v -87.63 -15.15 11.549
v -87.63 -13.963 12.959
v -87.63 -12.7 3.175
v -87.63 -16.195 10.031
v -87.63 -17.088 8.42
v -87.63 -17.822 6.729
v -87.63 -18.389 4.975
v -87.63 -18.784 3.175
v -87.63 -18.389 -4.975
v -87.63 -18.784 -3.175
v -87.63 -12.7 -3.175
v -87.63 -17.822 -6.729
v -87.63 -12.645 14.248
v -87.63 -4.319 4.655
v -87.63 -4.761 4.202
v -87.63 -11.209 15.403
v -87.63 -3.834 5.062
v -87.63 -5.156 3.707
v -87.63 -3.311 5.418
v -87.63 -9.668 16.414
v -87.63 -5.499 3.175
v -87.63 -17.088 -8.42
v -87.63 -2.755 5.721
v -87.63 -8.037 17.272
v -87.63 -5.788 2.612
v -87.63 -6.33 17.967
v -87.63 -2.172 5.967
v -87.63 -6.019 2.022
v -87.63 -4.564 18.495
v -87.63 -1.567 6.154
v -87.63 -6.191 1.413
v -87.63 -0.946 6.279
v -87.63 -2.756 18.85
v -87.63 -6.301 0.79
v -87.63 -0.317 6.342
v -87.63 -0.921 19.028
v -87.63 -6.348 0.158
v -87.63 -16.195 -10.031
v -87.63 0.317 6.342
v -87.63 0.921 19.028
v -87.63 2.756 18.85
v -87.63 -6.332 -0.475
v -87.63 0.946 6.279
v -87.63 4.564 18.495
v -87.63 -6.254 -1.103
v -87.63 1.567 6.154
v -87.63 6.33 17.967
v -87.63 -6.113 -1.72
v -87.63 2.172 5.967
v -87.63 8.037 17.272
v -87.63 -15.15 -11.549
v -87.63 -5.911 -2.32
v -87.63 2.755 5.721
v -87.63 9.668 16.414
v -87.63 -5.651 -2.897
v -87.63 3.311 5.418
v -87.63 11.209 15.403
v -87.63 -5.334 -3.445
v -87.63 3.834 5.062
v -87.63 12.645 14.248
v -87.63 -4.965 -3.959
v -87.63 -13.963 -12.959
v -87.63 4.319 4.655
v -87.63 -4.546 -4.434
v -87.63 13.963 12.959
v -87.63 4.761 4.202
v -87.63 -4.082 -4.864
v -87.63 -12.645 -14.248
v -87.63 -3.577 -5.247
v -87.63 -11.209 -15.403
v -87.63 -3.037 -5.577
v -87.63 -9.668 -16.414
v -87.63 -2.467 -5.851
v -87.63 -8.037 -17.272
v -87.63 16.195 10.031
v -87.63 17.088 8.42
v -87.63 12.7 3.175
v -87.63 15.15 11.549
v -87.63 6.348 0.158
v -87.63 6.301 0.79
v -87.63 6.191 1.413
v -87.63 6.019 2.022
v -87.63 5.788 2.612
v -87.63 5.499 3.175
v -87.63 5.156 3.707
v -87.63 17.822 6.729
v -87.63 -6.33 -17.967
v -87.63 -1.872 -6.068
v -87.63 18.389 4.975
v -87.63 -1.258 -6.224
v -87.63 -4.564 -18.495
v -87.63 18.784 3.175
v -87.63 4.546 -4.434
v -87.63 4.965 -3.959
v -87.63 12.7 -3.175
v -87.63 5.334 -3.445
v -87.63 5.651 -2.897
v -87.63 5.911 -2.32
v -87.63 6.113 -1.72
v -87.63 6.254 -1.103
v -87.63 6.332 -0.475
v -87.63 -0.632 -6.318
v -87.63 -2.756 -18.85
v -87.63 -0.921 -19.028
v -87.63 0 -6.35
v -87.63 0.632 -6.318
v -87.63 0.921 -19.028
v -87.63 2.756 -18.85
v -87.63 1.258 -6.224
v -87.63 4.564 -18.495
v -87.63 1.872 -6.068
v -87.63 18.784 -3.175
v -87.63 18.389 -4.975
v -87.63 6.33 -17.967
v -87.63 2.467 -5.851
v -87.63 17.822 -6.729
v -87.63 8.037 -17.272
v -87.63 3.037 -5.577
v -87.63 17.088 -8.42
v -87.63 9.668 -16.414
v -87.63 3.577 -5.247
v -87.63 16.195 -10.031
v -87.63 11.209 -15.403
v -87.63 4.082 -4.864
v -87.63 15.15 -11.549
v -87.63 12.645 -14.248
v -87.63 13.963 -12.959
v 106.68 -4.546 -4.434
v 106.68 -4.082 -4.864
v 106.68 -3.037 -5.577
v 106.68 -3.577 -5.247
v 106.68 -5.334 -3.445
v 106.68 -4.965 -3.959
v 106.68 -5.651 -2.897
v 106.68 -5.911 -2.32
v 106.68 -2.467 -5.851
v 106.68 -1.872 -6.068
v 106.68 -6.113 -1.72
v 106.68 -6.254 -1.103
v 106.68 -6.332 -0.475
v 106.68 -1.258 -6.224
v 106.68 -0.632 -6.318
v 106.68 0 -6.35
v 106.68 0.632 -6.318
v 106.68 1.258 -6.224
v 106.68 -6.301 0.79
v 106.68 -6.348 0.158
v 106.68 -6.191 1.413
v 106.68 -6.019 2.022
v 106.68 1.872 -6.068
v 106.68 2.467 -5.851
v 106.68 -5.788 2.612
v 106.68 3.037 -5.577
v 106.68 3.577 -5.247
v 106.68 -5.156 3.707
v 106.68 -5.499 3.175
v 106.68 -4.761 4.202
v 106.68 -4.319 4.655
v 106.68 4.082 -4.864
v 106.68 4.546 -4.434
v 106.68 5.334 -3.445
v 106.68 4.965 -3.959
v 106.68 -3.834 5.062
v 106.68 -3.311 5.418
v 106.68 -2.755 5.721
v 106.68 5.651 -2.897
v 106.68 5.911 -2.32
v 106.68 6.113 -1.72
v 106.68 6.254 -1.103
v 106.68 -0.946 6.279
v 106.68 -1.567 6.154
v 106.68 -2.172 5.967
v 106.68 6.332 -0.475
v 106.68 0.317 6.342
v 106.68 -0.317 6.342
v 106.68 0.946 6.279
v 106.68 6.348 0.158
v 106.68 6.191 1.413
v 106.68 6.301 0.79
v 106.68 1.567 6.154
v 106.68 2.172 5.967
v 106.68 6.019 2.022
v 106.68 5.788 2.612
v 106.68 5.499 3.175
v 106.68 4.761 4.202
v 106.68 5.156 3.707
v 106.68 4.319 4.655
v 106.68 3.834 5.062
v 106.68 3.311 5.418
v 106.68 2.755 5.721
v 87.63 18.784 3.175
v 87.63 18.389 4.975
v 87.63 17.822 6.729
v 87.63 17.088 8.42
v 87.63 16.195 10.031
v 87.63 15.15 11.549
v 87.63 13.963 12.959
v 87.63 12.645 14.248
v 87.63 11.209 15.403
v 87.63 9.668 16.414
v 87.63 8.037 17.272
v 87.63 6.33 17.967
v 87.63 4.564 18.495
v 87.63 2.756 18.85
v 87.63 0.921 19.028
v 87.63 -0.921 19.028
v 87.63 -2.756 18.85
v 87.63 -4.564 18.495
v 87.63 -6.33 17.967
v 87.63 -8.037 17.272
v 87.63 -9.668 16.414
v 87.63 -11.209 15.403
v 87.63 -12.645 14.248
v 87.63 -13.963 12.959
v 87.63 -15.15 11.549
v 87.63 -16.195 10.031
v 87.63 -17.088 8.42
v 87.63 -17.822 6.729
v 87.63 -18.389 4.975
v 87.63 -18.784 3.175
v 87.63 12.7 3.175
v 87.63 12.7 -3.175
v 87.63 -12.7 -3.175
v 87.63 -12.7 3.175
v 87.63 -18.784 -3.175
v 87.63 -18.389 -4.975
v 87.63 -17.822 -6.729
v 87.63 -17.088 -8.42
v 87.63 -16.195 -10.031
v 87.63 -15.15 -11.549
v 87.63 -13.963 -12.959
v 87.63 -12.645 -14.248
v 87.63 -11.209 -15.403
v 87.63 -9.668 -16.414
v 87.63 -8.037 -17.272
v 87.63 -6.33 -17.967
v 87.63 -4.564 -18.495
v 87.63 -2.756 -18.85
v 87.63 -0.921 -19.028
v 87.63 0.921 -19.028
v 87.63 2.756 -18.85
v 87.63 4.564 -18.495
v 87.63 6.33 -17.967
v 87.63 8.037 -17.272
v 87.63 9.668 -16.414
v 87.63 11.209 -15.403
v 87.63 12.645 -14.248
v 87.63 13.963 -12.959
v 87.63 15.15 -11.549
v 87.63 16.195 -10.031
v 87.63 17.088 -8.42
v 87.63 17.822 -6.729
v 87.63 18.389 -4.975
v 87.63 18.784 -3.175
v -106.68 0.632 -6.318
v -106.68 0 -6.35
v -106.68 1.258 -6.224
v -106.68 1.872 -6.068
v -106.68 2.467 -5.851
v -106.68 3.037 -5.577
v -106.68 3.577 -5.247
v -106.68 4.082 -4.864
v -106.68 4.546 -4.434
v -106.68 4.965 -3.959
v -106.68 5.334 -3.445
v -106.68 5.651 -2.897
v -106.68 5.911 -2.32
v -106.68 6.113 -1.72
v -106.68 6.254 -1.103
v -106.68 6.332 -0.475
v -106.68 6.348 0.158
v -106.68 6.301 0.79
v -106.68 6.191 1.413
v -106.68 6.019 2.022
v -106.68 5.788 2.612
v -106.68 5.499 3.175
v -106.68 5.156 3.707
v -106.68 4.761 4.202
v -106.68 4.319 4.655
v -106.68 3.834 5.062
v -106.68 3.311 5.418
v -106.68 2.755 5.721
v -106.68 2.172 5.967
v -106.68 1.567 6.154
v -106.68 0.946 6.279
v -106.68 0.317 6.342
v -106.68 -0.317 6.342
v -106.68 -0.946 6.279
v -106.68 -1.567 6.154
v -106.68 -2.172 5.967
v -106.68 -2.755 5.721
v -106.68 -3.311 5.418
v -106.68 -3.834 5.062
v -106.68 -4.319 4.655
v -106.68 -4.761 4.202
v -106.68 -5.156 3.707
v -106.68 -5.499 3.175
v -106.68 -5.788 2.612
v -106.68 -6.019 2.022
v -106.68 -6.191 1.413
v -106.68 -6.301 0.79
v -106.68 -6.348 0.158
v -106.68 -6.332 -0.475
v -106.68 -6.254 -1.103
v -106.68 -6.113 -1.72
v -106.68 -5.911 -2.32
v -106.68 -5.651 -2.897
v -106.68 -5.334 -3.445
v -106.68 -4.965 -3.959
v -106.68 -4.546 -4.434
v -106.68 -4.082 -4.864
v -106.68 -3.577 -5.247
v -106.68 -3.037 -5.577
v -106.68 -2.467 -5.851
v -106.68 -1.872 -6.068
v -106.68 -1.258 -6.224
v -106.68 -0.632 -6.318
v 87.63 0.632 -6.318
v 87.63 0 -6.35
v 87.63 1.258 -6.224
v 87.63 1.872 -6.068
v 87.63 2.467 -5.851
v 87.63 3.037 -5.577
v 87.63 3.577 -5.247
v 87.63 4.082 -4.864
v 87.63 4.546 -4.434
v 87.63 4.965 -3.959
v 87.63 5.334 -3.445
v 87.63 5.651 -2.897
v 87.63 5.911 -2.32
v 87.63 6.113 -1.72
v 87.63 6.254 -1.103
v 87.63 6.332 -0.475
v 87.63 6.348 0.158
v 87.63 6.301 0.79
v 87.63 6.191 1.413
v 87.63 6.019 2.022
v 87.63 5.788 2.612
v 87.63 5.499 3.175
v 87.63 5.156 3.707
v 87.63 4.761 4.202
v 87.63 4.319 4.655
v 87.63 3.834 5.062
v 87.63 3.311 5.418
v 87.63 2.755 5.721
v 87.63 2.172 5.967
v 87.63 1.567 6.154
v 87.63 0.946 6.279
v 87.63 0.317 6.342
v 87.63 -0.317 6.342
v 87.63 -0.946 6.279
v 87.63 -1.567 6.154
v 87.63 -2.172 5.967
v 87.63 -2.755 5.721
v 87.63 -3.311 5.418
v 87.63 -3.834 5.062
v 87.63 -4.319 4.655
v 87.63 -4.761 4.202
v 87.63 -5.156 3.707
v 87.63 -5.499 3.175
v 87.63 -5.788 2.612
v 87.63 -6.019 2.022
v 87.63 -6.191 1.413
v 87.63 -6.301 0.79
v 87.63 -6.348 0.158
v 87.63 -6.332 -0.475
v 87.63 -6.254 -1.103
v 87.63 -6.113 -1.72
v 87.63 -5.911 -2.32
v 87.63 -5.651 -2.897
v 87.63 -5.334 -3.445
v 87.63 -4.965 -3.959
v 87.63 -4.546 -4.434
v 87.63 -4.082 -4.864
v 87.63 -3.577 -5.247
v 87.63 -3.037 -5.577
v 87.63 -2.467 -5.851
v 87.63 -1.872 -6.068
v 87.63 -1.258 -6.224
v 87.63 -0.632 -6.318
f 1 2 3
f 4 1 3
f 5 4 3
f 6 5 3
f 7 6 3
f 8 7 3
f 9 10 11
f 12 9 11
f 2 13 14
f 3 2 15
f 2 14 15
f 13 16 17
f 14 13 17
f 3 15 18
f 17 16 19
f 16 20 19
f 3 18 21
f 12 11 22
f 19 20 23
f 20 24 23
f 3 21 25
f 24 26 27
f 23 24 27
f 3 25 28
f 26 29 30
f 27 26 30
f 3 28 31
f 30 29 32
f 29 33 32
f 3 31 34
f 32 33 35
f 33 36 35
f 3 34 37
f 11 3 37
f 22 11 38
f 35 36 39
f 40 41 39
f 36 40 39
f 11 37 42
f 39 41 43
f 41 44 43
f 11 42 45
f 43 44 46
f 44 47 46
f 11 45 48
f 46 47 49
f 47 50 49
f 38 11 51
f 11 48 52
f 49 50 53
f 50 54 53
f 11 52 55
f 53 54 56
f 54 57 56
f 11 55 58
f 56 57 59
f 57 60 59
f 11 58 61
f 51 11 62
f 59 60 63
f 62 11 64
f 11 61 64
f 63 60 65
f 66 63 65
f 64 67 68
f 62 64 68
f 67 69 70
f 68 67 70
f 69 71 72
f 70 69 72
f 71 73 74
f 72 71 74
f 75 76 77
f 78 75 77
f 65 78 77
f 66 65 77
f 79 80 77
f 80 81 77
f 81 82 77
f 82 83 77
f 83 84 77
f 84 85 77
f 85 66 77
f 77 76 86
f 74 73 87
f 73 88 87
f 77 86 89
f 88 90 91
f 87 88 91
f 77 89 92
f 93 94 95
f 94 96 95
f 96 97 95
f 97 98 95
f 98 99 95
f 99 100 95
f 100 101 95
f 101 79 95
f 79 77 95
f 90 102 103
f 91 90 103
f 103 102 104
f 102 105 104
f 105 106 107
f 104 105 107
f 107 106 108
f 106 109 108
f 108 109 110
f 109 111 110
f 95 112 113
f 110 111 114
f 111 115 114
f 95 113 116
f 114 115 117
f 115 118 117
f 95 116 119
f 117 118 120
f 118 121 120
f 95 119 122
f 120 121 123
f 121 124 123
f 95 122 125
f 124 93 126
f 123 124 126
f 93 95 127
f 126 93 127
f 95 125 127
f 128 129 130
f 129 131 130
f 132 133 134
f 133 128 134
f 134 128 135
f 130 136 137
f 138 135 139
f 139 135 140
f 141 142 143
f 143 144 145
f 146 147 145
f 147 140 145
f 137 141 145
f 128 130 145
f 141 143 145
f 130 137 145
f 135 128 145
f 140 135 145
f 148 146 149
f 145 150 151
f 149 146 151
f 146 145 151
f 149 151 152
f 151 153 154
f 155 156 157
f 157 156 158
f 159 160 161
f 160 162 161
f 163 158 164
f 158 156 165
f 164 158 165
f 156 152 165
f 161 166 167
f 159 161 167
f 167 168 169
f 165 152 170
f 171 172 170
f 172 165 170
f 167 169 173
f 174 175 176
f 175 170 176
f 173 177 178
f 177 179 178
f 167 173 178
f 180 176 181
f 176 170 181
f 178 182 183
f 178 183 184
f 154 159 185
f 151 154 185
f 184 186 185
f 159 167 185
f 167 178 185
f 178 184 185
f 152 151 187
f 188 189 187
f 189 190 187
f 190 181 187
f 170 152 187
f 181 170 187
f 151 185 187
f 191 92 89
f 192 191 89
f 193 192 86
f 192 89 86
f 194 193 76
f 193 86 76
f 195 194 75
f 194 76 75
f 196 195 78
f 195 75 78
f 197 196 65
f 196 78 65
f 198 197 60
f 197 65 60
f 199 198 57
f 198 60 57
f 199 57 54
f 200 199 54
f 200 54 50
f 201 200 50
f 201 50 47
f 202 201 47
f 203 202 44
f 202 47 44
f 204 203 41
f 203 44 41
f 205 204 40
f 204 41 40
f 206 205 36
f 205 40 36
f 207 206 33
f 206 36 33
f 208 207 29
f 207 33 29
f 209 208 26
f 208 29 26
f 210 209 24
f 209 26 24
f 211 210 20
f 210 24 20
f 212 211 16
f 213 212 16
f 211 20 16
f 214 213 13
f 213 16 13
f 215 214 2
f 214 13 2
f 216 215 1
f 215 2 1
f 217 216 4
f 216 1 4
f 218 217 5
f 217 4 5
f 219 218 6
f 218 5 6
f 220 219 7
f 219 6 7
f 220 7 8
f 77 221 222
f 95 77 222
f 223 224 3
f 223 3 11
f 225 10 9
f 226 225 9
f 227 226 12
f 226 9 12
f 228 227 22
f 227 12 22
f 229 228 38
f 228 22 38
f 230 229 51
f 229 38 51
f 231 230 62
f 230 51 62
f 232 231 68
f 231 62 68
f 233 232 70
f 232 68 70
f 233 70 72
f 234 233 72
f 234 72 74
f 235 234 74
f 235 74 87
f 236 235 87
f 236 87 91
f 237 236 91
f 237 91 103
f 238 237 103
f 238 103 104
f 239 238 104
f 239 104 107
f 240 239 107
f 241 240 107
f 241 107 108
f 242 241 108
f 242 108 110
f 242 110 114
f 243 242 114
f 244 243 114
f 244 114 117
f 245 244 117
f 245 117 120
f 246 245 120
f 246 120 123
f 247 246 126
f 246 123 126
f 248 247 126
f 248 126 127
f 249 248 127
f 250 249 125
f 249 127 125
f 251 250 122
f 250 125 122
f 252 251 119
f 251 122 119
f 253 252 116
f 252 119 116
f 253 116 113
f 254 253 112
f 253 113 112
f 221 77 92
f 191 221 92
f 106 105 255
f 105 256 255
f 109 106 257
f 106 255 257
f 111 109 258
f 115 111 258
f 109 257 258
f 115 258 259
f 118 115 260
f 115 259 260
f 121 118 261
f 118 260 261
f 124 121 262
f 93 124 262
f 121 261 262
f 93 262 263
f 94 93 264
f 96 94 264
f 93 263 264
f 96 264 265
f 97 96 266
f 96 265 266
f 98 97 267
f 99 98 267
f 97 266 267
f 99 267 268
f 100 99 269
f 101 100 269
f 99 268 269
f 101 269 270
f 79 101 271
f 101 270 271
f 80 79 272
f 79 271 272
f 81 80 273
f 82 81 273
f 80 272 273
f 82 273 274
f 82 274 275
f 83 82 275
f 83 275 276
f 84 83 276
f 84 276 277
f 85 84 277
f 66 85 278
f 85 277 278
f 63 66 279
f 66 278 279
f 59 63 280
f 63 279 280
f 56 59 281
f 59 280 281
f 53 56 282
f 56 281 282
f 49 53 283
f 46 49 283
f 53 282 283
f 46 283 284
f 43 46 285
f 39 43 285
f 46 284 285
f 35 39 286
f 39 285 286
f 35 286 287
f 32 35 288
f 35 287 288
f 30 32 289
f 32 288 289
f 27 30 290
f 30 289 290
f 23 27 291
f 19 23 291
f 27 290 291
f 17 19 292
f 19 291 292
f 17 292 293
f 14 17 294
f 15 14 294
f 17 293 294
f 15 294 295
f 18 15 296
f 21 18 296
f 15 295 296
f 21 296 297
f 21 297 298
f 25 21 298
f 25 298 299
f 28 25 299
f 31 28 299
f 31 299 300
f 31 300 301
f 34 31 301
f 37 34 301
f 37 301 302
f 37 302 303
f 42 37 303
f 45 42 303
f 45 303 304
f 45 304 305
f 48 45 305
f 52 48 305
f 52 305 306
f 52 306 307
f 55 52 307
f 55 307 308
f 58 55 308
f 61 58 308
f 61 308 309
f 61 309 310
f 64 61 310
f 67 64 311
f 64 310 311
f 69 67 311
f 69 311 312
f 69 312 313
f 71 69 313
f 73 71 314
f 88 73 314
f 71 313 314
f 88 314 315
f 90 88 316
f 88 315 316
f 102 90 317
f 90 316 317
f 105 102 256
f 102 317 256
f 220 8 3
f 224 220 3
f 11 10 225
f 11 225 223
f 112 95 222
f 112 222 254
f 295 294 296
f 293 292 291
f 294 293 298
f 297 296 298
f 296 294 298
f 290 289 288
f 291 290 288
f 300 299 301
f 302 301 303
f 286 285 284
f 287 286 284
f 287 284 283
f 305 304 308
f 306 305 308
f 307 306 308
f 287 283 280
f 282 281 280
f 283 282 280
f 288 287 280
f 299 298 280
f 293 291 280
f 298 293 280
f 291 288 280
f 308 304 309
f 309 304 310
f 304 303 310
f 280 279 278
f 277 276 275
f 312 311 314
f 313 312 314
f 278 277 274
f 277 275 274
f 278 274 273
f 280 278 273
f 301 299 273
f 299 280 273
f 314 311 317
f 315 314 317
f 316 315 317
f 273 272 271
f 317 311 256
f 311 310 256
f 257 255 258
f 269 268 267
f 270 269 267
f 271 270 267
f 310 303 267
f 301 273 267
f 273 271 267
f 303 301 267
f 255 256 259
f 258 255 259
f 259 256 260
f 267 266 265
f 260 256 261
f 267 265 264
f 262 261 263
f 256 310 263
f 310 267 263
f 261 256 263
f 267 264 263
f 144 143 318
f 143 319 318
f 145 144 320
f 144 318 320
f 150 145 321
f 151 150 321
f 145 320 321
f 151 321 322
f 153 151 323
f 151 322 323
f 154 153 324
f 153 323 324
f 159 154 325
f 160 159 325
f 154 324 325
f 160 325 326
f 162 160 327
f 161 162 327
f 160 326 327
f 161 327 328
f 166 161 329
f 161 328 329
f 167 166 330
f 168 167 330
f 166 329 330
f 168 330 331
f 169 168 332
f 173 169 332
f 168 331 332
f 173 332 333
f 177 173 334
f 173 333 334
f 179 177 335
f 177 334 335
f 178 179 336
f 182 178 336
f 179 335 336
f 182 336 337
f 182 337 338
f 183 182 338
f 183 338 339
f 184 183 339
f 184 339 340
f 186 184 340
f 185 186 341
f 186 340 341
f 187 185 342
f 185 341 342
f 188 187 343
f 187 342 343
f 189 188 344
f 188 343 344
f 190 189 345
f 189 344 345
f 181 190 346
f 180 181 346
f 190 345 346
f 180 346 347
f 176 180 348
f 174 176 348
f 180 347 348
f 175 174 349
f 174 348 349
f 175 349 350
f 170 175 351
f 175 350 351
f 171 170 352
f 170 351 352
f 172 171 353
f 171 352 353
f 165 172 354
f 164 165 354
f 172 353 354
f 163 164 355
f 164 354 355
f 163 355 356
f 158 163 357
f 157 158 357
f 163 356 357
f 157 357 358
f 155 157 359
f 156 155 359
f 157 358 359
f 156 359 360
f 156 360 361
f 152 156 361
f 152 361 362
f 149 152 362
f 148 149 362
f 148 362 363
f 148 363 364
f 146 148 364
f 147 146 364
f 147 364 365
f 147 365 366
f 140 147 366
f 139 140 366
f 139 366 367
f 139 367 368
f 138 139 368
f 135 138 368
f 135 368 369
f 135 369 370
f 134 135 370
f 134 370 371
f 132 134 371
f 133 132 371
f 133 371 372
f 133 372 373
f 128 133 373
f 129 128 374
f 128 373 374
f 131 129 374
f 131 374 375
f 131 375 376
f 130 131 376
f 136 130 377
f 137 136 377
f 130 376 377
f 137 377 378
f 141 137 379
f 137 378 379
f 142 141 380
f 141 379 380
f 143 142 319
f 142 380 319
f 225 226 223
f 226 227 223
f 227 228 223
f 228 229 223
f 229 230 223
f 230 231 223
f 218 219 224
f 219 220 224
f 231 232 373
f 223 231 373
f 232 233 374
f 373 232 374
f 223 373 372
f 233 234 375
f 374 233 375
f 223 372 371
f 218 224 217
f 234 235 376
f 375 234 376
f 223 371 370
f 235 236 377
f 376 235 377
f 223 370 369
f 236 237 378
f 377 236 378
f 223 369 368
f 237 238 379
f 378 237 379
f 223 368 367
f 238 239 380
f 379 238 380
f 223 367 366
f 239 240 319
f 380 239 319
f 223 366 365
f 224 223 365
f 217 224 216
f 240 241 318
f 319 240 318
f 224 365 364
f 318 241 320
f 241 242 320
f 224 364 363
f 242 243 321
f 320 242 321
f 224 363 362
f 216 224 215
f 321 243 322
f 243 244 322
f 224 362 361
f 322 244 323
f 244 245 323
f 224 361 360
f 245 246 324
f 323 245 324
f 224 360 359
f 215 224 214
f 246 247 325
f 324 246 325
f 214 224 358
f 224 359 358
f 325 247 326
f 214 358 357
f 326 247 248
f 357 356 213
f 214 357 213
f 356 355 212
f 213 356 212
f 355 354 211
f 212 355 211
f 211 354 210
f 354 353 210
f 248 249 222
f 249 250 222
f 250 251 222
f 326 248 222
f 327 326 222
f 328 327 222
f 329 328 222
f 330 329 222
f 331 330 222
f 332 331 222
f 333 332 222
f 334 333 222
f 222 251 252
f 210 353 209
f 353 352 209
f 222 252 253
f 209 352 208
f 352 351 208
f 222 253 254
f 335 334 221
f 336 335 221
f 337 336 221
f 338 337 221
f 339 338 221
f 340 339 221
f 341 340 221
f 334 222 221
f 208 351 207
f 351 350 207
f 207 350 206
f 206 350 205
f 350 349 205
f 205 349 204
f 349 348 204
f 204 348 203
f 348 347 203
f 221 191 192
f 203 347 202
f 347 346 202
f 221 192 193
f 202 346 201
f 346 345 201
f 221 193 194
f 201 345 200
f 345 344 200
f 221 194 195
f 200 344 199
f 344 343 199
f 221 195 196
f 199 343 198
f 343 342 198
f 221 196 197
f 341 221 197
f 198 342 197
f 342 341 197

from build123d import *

# Parameters (mm, degrees)
SKETCH2_W          = 6.35
SKETCH2_H          = 6.35
CUT_EXTRUDE1_DEPTH = 195.31


with BuildPart() as part:
    # Sketch1 → Revolve1 (revolve)
    with BuildSketch(Plane(origin=(0, 0, 0), x_dir=(1, 0, 0), z_dir=(0, 1, 0))):
        Polygon((-106.68, 0), (106.68, 0), (106.68, 6.35), (87.63, 6.35), (87.63, 19.05), (-87.63, 19.05), (-87.63, 6.35), (-106.68, 6.35), align=None)
    revolve(axis=Axis((-106.68, 0, 0), (1, 0, 0)))

    # Sketch2 → Cut-Extrude1 (cut, through all)
    with BuildSketch(Plane(origin=(87.63, 0, 0), x_dir=(0, 0, -1), z_dir=(1, 0, 0))):
        with Locations((0, 15.875)):
            Rectangle(SKETCH2_W, SKETCH2_H)
        with Locations((0, -15.875)):
            Rectangle(SKETCH2_W, SKETCH2_H)
    extrude(amount=-CUT_EXTRUDE1_DEPTH, mode=Mode.SUBTRACT)


solid = part.part
